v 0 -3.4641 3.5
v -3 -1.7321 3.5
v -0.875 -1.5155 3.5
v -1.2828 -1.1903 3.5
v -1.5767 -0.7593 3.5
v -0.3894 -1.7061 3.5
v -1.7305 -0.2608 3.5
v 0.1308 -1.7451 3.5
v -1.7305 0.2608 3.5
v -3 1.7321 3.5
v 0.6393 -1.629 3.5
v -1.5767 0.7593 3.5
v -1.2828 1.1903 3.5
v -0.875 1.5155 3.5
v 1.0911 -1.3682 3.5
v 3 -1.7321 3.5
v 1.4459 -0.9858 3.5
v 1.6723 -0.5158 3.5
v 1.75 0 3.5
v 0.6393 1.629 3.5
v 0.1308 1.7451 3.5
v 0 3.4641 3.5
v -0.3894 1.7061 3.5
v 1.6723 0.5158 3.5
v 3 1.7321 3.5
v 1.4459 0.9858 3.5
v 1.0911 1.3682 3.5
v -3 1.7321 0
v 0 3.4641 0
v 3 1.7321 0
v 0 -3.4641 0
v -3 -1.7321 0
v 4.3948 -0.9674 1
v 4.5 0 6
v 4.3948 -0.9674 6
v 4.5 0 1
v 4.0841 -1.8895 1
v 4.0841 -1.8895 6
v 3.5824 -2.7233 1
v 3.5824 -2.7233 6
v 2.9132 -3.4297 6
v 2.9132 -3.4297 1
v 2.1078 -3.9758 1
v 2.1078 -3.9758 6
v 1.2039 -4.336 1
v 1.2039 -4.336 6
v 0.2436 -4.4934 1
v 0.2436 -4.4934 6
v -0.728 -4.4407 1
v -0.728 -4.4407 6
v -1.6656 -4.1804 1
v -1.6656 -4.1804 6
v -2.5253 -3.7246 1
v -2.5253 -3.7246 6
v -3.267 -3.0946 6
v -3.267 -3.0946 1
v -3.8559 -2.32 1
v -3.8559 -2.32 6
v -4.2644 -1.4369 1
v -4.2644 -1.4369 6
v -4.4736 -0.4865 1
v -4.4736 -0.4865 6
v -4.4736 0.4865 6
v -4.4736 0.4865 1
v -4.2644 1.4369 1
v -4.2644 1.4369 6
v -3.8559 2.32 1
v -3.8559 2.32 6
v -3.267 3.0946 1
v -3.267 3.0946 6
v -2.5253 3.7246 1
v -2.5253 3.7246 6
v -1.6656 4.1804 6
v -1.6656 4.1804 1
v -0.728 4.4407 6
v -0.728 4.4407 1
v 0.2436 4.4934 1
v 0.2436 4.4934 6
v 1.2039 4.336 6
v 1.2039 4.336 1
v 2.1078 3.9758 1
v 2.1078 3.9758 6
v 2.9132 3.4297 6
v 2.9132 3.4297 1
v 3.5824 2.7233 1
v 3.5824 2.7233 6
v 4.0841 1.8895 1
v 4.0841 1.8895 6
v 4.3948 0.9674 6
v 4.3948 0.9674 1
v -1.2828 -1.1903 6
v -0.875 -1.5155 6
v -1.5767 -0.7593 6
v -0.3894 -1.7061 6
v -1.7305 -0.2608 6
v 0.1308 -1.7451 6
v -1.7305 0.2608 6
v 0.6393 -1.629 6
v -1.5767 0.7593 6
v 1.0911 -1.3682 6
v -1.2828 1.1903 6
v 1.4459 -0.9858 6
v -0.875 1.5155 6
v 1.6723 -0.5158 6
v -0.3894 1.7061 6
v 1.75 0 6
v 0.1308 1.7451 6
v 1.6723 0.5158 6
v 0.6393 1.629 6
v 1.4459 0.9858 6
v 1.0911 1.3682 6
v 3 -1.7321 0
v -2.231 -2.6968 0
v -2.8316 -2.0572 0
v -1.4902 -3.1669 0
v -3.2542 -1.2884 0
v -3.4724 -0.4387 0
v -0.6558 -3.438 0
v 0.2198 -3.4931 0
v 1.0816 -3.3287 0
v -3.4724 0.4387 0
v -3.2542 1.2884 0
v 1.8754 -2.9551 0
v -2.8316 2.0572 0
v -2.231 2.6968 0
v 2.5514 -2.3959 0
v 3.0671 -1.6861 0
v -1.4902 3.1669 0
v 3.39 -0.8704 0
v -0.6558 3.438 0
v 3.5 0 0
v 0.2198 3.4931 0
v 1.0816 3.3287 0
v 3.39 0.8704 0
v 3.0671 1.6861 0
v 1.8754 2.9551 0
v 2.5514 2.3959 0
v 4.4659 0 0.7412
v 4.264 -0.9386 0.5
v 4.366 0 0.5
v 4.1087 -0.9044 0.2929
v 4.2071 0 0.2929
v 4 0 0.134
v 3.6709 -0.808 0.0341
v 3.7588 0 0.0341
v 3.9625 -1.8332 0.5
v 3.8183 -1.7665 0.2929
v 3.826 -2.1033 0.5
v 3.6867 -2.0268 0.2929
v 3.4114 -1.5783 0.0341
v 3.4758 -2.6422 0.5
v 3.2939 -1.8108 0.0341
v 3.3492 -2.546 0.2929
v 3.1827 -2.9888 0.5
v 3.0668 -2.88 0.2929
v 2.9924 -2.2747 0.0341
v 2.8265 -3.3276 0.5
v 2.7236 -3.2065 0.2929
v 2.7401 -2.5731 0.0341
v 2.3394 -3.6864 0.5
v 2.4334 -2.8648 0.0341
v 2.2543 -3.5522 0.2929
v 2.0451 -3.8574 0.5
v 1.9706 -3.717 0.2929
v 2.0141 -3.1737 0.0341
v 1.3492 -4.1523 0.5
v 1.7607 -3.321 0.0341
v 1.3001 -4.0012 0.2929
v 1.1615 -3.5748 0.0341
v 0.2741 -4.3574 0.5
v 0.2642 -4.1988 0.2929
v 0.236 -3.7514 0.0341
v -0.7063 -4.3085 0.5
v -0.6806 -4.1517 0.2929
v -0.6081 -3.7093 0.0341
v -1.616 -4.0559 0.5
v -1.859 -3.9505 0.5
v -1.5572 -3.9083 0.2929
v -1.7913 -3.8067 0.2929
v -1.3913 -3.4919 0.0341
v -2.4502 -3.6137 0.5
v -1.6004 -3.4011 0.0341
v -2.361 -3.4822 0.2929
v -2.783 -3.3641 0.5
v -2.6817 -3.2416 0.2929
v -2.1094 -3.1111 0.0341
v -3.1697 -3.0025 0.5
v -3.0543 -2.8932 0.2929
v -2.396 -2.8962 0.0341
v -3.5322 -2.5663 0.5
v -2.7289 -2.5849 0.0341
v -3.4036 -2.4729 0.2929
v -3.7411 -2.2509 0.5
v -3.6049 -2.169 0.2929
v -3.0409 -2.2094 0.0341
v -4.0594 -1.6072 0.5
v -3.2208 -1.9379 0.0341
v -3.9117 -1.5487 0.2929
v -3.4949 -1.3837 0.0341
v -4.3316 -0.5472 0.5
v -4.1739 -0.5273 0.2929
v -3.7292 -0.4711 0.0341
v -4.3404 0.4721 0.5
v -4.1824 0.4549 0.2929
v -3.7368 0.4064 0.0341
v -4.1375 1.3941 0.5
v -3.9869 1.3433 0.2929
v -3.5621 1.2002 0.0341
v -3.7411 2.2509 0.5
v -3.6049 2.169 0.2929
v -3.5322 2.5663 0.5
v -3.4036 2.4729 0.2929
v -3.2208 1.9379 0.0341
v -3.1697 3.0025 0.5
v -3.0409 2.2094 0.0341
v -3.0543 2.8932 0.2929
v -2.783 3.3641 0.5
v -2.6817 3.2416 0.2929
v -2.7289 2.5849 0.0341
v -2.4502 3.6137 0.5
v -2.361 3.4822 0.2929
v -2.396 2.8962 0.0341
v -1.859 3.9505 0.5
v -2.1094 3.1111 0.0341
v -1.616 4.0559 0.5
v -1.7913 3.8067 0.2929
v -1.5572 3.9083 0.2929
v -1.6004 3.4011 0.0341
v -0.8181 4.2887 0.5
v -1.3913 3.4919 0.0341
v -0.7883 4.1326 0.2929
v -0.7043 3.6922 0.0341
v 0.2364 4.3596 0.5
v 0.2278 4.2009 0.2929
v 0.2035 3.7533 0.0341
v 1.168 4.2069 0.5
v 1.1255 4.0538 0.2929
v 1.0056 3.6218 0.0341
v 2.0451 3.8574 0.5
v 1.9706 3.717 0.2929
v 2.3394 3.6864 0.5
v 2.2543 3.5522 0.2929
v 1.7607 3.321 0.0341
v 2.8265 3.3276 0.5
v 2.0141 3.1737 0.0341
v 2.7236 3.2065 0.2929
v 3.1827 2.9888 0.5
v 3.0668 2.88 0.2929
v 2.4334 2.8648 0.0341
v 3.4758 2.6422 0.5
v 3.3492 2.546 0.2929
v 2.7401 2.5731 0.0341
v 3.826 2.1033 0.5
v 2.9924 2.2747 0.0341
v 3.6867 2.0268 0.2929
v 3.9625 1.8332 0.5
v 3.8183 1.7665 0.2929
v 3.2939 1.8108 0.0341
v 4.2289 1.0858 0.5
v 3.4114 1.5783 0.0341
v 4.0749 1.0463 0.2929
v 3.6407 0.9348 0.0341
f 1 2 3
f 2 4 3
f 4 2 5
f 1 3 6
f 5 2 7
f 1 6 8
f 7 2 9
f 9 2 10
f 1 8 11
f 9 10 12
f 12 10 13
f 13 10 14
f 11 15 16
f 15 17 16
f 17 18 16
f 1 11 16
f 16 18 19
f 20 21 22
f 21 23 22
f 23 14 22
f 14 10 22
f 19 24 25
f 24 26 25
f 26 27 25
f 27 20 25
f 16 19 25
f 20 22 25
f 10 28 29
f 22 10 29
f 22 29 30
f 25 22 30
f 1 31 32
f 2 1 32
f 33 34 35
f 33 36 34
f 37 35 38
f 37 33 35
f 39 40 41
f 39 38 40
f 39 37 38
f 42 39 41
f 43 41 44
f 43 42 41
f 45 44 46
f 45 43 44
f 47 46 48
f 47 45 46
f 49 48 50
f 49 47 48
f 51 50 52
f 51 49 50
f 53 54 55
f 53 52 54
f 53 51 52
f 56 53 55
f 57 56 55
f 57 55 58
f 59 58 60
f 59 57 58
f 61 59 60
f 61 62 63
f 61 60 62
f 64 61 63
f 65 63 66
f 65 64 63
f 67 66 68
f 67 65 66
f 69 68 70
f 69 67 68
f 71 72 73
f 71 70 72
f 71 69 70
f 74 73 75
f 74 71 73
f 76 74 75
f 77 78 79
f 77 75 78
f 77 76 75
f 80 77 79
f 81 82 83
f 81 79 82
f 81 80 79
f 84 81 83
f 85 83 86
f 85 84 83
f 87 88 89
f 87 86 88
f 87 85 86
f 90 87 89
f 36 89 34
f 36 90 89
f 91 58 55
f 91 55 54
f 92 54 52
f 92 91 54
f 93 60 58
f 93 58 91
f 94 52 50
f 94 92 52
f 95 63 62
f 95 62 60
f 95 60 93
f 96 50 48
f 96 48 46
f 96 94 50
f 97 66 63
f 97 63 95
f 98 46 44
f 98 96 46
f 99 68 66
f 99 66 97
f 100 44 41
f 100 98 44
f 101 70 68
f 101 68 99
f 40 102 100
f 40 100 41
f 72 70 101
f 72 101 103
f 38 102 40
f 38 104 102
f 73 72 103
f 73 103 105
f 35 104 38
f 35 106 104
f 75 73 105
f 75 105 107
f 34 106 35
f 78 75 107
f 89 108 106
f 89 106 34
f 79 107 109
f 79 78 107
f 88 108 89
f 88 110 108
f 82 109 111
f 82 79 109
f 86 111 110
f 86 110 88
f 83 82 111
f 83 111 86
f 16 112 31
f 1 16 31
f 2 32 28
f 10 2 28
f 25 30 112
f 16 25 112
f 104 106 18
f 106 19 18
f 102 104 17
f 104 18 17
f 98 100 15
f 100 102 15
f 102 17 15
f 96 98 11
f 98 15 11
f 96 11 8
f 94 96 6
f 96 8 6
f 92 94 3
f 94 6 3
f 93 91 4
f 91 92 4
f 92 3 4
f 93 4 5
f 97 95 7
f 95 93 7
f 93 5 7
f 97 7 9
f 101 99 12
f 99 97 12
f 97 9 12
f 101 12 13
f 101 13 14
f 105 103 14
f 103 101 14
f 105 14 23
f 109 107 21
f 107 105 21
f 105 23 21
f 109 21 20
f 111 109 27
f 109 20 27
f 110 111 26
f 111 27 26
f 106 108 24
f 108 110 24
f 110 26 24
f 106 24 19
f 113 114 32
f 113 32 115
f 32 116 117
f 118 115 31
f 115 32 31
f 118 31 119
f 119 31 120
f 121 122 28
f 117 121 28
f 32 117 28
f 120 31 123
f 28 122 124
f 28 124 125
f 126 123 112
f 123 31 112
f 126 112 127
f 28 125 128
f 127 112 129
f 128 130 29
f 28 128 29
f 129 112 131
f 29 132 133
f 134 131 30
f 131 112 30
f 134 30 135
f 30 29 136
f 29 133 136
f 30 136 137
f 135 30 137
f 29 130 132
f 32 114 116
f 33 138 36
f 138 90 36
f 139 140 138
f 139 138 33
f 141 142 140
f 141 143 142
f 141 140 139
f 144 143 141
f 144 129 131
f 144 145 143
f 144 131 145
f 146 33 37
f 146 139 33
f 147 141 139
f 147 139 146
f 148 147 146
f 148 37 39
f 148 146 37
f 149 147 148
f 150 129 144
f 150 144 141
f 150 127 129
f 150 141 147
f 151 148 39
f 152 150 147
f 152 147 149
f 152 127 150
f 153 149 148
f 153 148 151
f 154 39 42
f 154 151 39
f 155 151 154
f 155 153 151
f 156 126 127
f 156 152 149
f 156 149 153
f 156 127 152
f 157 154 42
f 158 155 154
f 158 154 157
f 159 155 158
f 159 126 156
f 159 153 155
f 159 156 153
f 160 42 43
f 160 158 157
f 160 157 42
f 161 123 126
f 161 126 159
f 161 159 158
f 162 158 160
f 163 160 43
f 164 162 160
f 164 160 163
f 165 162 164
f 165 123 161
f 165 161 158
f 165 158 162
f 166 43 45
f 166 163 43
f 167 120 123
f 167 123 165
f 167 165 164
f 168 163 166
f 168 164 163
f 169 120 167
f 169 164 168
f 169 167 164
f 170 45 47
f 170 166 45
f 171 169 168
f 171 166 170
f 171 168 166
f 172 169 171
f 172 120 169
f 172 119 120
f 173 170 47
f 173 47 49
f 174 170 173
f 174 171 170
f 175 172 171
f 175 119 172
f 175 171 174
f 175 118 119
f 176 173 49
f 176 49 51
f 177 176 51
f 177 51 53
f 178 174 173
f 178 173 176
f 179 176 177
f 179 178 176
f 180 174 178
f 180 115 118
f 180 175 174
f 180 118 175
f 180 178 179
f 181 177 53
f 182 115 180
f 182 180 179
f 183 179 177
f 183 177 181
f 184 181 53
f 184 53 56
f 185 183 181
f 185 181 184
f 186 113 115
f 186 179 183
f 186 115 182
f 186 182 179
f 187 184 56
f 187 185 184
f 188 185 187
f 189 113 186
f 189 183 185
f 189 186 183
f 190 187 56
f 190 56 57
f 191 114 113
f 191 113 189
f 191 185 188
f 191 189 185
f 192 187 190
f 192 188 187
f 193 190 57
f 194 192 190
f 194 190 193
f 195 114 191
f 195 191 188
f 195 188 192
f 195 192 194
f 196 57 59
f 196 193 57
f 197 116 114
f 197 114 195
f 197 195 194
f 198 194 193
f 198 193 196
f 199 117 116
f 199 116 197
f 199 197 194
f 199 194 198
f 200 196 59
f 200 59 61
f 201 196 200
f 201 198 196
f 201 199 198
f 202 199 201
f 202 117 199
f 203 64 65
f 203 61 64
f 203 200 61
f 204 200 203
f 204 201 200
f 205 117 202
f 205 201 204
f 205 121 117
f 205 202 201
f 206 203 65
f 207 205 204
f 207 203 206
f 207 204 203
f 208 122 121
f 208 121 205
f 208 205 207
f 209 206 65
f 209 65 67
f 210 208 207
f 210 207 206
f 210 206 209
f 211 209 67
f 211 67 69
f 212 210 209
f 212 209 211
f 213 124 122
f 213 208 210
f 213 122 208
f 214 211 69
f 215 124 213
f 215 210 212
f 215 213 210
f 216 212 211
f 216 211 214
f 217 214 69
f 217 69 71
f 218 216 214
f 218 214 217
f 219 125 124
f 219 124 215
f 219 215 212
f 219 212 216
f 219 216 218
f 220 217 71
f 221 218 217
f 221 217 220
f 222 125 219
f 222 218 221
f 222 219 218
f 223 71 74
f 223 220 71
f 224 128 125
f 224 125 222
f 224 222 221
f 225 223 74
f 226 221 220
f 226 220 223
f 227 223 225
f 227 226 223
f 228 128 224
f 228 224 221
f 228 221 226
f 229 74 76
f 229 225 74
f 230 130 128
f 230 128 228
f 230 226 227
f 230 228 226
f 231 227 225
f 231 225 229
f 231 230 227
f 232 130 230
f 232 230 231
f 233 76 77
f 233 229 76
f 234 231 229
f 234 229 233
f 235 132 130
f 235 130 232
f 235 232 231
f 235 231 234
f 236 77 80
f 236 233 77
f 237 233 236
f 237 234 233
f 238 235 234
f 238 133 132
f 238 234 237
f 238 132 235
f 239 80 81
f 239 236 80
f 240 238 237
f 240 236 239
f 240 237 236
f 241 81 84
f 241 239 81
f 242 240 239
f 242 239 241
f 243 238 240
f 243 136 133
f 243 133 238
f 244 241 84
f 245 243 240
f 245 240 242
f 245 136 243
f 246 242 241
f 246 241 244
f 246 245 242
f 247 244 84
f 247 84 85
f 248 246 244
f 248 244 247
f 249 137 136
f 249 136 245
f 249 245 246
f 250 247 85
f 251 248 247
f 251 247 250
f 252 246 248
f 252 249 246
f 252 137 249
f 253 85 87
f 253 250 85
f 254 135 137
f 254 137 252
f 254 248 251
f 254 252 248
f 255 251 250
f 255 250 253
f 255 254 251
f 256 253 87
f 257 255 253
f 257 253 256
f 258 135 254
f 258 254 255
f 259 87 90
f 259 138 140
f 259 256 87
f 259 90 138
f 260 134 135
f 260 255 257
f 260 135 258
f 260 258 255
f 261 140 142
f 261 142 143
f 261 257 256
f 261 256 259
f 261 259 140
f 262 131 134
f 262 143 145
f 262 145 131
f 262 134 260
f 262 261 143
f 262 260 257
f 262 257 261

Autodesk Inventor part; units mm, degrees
ref_plane "YZ Plane" through (0, 0, 0) normal (1, 0, 0) x (0, 1, 0)
ref_plane "XZ Plane" through (0, 0, 0) normal (0, 1, 0) x (-1, 0, 0)
ref_plane "XY Plane" through (0, 0, 0) normal (0, 0, 1) x (1, 0, 0)
sketch "Эскиз1" plane through (0, 0, 0) normal (0, 0, 1) x (1, 0, 0)
  circle A0 centre (0, 0) radius 4.5
  circle A1 centre (0, 0) radius 1.75
  line L0 (0, 3.4641) -> (3, 1.7321)
  line L1 (3, 1.7321) -> (3, -1.7321)
  line L2 (3, -1.7321) -> (0, -3.4641)
  line L3 (0, -3.4641) -> (-3, -1.7321)
  line L4 (-3, -1.7321) -> (-3, 1.7321)
  line L5 (-3, 1.7321) -> (0, 3.4641)
  dimension "d0" = 3.5
  dimension "d1" = 9
  dimension "d3" = 6
extrude "Выдавливание1" add sketch "Эскиз1" along normal blind 6 contours A0 | L0 L1 L2 L3 L4 L5
extrude "Выдавливание2" cut sketch "Эскиз1" along normal blind 3.5 contours L0 L1 L2 L3 L4 L5
fillet "Сопряжение1" radius 1 1 edges at (-4.5, 0, 0)
properties part number "Стопор"
